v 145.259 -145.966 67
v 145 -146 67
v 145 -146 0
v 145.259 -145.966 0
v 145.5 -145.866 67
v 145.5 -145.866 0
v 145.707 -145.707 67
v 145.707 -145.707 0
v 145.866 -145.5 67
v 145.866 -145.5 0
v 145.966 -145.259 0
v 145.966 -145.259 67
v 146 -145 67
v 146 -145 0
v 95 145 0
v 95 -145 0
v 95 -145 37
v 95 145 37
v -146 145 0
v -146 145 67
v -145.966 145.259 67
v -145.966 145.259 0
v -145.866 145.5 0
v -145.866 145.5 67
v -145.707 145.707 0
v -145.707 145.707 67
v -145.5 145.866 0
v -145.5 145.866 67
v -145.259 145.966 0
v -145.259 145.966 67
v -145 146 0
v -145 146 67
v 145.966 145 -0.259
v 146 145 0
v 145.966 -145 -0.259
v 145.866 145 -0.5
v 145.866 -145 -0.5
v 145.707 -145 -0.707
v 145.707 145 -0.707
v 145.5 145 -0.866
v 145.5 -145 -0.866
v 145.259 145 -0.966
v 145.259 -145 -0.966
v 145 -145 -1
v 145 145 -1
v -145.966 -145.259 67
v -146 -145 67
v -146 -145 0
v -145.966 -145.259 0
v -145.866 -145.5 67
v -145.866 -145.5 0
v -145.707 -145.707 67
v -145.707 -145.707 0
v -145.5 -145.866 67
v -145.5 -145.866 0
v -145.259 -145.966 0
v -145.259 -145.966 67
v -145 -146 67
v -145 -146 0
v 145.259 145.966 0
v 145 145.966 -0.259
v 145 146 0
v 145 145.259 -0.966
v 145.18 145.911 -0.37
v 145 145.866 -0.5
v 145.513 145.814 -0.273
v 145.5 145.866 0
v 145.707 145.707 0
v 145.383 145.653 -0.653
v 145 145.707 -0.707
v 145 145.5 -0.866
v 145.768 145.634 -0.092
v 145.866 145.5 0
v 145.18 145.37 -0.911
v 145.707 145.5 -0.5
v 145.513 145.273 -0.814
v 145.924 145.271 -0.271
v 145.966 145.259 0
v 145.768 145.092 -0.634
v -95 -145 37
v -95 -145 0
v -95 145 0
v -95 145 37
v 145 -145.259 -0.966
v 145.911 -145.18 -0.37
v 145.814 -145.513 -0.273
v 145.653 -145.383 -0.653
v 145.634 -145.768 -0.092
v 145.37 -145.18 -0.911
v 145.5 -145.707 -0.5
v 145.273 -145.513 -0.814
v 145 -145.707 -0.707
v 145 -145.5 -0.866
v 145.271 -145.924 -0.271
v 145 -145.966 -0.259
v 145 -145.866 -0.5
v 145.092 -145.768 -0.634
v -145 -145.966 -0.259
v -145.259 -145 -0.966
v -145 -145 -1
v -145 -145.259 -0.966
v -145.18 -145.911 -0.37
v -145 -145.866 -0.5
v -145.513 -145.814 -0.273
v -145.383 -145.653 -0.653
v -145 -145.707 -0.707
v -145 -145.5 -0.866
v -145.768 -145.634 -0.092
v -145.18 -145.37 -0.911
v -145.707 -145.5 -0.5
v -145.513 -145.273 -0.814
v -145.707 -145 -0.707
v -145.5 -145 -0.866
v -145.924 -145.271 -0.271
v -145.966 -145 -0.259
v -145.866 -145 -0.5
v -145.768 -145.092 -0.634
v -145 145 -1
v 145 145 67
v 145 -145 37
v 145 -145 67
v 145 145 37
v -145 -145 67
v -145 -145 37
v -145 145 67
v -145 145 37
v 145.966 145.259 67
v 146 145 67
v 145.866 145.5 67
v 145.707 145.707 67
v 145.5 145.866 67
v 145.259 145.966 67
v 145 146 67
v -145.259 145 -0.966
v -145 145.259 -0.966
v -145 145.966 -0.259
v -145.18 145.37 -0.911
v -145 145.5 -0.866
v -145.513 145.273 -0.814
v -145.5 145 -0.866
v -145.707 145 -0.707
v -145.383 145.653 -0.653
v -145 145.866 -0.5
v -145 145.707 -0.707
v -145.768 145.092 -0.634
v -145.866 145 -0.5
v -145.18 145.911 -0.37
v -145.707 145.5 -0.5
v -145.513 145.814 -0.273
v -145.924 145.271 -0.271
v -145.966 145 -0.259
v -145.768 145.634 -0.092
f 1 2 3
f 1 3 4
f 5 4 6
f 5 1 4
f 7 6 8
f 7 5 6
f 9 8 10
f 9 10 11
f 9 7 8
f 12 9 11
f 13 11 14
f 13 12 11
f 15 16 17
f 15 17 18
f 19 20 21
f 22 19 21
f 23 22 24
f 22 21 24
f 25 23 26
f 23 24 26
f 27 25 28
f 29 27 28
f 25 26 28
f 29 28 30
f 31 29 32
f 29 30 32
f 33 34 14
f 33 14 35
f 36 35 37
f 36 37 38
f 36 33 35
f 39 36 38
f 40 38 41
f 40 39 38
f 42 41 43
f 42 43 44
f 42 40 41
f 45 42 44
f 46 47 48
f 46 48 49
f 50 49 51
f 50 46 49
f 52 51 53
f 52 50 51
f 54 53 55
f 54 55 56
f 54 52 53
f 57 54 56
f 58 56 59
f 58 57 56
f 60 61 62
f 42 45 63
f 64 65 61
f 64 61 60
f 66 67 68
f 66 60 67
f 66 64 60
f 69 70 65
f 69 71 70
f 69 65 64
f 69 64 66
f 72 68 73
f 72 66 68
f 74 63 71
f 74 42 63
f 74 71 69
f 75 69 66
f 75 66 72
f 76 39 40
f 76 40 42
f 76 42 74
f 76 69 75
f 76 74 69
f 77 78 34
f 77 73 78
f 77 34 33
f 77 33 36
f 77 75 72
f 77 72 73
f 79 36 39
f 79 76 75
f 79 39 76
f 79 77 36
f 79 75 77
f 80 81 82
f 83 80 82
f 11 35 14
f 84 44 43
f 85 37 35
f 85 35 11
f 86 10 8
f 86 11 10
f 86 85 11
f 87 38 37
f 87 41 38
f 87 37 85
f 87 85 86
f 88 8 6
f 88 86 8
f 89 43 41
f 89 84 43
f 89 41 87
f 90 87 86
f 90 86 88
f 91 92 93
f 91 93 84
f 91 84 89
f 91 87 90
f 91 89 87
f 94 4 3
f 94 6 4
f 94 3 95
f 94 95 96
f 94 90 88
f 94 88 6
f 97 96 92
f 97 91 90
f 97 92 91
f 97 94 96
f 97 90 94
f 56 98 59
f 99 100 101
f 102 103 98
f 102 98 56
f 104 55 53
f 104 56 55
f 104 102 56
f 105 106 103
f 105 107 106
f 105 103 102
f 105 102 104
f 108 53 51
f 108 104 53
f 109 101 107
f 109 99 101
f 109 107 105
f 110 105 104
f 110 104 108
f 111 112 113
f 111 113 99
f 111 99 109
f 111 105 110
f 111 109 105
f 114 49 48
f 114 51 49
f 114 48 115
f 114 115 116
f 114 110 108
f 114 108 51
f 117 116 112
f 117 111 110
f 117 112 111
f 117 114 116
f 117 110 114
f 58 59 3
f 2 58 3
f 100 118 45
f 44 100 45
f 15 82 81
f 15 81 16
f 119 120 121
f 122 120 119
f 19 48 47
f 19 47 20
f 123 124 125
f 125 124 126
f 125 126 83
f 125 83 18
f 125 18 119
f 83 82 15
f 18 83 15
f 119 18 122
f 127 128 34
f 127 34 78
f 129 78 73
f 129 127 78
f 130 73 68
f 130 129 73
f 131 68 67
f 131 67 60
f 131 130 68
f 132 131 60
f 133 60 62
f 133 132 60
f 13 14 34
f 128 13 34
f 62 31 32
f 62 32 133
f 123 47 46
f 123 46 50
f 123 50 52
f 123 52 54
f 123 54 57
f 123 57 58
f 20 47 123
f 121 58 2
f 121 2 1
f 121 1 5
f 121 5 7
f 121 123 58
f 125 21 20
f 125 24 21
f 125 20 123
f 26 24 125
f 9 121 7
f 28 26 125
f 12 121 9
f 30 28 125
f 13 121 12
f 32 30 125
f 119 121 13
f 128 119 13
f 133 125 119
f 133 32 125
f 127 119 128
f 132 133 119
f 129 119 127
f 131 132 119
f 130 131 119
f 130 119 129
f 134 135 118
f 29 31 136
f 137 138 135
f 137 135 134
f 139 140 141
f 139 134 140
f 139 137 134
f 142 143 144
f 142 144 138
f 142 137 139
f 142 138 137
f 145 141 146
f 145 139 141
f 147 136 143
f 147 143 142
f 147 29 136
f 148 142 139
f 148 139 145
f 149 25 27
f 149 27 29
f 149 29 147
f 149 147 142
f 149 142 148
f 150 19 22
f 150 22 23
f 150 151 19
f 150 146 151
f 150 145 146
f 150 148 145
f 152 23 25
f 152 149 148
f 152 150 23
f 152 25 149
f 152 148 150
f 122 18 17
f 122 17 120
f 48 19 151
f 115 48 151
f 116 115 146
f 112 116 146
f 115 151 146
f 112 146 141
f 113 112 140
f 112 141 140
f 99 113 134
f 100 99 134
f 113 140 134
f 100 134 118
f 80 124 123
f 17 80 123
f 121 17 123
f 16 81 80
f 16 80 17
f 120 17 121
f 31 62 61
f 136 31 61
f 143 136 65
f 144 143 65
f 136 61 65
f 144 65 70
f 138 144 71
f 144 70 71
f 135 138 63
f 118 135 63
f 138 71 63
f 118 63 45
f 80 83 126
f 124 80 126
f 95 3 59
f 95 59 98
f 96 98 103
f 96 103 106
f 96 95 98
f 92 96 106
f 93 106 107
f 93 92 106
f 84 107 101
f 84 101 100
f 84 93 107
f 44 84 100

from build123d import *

# Parameters (mm, degrees)
SKETCH_W     = 290
SKETCH_H     = 290
PAD_DEPTH    = 67
THICKNESS_T  = 1
SKETCH001_W  = 50
SKETCH001_H  = 290
PAD001_DEPTH = 37


with BuildPart() as part:
    # Sketch → Pad (new body)
    with BuildSketch(Plane.XY):
        Rectangle(SKETCH_W, SKETCH_H)
    extrude(amount=PAD_DEPTH)

    # Thickness
    thickness_openings = [part.faces().sort_by_distance(p)[0] for p in [
        (0, 0, 67),
    ]]
    offset(amount=THICKNESS_T, openings=thickness_openings)

    # Sketch001 (on Face5 of Thickness) → Pad001 (join)
    with BuildSketch(Plane(origin=(120, 0, 0), x_dir=(1, 0, 0), z_dir=(0, 0, 1))):
        Rectangle(SKETCH001_W, SKETCH001_H)
    pad001 = extrude(amount=PAD001_DEPTH)

    # Mirrored: Pad001 across YZ
    add(pad001.mirror(Plane.YZ))


solid = part.part
